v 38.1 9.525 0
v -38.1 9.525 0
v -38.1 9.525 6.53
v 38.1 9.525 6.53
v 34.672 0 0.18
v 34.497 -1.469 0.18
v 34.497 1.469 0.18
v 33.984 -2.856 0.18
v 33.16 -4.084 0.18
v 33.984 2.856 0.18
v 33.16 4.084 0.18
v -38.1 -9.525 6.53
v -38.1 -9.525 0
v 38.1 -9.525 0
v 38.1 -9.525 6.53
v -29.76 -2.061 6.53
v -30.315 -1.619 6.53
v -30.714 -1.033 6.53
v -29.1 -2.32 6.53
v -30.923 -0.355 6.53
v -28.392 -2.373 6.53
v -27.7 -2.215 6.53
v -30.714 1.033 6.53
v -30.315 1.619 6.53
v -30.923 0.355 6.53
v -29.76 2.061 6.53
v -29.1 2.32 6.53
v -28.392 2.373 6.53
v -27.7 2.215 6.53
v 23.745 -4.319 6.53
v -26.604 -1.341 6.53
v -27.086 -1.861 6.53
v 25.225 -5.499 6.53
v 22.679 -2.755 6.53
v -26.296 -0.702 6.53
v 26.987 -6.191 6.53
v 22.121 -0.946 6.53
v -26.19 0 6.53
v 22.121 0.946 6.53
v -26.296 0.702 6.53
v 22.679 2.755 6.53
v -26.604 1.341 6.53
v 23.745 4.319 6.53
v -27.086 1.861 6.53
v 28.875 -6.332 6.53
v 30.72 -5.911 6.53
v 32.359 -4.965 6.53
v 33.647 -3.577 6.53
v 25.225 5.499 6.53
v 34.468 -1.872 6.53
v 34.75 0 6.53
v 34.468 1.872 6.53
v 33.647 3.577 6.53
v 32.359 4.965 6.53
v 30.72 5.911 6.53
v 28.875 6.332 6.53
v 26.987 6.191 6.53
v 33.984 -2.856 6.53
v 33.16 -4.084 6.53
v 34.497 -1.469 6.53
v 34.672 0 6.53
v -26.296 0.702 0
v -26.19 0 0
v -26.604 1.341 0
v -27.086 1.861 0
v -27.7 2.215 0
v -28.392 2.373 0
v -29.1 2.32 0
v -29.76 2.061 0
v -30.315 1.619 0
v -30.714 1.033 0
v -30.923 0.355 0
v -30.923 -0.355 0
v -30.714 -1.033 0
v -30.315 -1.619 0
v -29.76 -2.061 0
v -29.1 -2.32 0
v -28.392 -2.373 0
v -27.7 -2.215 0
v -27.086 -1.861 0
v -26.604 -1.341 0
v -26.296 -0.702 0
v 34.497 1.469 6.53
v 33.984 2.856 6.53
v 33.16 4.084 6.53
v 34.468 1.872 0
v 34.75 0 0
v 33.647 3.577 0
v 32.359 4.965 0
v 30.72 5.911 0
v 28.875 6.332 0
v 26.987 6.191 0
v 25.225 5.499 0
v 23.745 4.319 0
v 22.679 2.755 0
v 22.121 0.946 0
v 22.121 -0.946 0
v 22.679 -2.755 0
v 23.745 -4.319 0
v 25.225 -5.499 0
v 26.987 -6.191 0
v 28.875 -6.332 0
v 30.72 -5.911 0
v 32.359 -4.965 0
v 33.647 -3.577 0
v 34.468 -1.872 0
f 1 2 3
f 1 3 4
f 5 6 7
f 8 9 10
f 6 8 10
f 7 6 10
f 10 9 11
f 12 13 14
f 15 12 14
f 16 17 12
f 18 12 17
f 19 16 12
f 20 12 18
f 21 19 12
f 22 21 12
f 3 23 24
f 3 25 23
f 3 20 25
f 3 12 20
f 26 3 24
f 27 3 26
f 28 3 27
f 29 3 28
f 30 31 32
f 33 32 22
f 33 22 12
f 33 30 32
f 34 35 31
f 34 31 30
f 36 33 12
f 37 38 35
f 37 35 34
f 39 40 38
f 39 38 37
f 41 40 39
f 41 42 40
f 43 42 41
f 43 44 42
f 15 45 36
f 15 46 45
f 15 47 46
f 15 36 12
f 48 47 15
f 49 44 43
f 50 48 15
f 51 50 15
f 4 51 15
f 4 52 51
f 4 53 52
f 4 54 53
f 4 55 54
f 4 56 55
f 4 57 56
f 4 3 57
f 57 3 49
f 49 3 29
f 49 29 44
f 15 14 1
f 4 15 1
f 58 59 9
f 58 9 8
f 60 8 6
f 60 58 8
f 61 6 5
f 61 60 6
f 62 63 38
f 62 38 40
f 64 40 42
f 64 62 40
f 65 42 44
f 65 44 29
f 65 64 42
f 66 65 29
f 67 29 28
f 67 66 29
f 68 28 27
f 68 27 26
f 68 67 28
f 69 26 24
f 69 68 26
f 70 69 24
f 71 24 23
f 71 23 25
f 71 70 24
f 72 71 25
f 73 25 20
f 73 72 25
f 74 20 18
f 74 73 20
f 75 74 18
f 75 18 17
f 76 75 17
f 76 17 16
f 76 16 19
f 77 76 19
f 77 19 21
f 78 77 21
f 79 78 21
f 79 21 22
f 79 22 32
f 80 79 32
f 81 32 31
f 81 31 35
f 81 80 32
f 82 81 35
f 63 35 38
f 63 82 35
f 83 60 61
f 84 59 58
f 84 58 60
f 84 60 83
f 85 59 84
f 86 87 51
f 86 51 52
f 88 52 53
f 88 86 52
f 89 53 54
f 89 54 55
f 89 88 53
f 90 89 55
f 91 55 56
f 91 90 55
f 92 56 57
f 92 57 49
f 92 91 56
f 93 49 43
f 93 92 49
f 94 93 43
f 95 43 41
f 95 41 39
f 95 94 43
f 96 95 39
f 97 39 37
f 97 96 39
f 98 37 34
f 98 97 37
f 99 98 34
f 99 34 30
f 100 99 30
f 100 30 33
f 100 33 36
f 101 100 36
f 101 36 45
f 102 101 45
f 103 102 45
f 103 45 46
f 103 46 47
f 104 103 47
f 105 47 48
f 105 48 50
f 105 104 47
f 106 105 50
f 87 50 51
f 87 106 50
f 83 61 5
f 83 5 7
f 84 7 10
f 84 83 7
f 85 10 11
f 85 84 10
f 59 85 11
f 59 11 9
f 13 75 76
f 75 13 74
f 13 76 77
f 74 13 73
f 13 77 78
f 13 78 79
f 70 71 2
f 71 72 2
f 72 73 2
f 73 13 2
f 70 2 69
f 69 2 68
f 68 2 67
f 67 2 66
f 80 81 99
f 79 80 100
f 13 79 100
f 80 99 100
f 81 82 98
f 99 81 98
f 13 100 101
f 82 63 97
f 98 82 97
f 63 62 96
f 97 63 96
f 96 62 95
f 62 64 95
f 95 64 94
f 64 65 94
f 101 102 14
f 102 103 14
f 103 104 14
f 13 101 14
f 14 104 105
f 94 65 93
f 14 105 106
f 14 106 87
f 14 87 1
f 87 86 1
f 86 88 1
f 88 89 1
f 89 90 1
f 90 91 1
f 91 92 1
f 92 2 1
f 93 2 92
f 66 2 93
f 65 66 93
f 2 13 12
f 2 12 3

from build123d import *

# Parameters (mm, degrees)
SKETCH1_W           = 76.2
SKETCH1_H           = 19.05
SKETCH1_R           = 2.38
SKETCH1_R_2         = 6.35
BOSS_EXTRUDE1_DEPTH = 6.53
BOSS_EXTRUDE2_DEPTH = 6.35


with BuildPart() as part:
    # Sketch1 → Boss-Extrude1 (new body)
    with BuildSketch(Plane.XY):
        Rectangle(SKETCH1_W, SKETCH1_H)
        with Locations((-28.57, 0)):
            Circle(SKETCH1_R, mode=Mode.SUBTRACT)
        with Locations((28.4, 0)):
            Circle(SKETCH1_R_2, mode=Mode.SUBTRACT)
    extrude(amount=BOSS_EXTRUDE1_DEPTH)


with BuildPart() as body_2:
    # Sketch2 → Boss-Extrude2 (new body)
    with BuildSketch(Plane.XY.offset(6.53)):
        with BuildLine():
            ThreePointArc((34.671845471, 0), (34.281752717, 2.177390775), (33.16, 4.08392527))
            Line((33.16, 4.08392527), (33.16, -4.08392527))
            ThreePointArc((33.16, -4.08392527), (34.281752717, -2.177390775), (34.671845471, 0))
        make_face()
    extrude(amount=-BOSS_EXTRUDE2_DEPTH)


solid = Compound([part.part, body_2.part])
